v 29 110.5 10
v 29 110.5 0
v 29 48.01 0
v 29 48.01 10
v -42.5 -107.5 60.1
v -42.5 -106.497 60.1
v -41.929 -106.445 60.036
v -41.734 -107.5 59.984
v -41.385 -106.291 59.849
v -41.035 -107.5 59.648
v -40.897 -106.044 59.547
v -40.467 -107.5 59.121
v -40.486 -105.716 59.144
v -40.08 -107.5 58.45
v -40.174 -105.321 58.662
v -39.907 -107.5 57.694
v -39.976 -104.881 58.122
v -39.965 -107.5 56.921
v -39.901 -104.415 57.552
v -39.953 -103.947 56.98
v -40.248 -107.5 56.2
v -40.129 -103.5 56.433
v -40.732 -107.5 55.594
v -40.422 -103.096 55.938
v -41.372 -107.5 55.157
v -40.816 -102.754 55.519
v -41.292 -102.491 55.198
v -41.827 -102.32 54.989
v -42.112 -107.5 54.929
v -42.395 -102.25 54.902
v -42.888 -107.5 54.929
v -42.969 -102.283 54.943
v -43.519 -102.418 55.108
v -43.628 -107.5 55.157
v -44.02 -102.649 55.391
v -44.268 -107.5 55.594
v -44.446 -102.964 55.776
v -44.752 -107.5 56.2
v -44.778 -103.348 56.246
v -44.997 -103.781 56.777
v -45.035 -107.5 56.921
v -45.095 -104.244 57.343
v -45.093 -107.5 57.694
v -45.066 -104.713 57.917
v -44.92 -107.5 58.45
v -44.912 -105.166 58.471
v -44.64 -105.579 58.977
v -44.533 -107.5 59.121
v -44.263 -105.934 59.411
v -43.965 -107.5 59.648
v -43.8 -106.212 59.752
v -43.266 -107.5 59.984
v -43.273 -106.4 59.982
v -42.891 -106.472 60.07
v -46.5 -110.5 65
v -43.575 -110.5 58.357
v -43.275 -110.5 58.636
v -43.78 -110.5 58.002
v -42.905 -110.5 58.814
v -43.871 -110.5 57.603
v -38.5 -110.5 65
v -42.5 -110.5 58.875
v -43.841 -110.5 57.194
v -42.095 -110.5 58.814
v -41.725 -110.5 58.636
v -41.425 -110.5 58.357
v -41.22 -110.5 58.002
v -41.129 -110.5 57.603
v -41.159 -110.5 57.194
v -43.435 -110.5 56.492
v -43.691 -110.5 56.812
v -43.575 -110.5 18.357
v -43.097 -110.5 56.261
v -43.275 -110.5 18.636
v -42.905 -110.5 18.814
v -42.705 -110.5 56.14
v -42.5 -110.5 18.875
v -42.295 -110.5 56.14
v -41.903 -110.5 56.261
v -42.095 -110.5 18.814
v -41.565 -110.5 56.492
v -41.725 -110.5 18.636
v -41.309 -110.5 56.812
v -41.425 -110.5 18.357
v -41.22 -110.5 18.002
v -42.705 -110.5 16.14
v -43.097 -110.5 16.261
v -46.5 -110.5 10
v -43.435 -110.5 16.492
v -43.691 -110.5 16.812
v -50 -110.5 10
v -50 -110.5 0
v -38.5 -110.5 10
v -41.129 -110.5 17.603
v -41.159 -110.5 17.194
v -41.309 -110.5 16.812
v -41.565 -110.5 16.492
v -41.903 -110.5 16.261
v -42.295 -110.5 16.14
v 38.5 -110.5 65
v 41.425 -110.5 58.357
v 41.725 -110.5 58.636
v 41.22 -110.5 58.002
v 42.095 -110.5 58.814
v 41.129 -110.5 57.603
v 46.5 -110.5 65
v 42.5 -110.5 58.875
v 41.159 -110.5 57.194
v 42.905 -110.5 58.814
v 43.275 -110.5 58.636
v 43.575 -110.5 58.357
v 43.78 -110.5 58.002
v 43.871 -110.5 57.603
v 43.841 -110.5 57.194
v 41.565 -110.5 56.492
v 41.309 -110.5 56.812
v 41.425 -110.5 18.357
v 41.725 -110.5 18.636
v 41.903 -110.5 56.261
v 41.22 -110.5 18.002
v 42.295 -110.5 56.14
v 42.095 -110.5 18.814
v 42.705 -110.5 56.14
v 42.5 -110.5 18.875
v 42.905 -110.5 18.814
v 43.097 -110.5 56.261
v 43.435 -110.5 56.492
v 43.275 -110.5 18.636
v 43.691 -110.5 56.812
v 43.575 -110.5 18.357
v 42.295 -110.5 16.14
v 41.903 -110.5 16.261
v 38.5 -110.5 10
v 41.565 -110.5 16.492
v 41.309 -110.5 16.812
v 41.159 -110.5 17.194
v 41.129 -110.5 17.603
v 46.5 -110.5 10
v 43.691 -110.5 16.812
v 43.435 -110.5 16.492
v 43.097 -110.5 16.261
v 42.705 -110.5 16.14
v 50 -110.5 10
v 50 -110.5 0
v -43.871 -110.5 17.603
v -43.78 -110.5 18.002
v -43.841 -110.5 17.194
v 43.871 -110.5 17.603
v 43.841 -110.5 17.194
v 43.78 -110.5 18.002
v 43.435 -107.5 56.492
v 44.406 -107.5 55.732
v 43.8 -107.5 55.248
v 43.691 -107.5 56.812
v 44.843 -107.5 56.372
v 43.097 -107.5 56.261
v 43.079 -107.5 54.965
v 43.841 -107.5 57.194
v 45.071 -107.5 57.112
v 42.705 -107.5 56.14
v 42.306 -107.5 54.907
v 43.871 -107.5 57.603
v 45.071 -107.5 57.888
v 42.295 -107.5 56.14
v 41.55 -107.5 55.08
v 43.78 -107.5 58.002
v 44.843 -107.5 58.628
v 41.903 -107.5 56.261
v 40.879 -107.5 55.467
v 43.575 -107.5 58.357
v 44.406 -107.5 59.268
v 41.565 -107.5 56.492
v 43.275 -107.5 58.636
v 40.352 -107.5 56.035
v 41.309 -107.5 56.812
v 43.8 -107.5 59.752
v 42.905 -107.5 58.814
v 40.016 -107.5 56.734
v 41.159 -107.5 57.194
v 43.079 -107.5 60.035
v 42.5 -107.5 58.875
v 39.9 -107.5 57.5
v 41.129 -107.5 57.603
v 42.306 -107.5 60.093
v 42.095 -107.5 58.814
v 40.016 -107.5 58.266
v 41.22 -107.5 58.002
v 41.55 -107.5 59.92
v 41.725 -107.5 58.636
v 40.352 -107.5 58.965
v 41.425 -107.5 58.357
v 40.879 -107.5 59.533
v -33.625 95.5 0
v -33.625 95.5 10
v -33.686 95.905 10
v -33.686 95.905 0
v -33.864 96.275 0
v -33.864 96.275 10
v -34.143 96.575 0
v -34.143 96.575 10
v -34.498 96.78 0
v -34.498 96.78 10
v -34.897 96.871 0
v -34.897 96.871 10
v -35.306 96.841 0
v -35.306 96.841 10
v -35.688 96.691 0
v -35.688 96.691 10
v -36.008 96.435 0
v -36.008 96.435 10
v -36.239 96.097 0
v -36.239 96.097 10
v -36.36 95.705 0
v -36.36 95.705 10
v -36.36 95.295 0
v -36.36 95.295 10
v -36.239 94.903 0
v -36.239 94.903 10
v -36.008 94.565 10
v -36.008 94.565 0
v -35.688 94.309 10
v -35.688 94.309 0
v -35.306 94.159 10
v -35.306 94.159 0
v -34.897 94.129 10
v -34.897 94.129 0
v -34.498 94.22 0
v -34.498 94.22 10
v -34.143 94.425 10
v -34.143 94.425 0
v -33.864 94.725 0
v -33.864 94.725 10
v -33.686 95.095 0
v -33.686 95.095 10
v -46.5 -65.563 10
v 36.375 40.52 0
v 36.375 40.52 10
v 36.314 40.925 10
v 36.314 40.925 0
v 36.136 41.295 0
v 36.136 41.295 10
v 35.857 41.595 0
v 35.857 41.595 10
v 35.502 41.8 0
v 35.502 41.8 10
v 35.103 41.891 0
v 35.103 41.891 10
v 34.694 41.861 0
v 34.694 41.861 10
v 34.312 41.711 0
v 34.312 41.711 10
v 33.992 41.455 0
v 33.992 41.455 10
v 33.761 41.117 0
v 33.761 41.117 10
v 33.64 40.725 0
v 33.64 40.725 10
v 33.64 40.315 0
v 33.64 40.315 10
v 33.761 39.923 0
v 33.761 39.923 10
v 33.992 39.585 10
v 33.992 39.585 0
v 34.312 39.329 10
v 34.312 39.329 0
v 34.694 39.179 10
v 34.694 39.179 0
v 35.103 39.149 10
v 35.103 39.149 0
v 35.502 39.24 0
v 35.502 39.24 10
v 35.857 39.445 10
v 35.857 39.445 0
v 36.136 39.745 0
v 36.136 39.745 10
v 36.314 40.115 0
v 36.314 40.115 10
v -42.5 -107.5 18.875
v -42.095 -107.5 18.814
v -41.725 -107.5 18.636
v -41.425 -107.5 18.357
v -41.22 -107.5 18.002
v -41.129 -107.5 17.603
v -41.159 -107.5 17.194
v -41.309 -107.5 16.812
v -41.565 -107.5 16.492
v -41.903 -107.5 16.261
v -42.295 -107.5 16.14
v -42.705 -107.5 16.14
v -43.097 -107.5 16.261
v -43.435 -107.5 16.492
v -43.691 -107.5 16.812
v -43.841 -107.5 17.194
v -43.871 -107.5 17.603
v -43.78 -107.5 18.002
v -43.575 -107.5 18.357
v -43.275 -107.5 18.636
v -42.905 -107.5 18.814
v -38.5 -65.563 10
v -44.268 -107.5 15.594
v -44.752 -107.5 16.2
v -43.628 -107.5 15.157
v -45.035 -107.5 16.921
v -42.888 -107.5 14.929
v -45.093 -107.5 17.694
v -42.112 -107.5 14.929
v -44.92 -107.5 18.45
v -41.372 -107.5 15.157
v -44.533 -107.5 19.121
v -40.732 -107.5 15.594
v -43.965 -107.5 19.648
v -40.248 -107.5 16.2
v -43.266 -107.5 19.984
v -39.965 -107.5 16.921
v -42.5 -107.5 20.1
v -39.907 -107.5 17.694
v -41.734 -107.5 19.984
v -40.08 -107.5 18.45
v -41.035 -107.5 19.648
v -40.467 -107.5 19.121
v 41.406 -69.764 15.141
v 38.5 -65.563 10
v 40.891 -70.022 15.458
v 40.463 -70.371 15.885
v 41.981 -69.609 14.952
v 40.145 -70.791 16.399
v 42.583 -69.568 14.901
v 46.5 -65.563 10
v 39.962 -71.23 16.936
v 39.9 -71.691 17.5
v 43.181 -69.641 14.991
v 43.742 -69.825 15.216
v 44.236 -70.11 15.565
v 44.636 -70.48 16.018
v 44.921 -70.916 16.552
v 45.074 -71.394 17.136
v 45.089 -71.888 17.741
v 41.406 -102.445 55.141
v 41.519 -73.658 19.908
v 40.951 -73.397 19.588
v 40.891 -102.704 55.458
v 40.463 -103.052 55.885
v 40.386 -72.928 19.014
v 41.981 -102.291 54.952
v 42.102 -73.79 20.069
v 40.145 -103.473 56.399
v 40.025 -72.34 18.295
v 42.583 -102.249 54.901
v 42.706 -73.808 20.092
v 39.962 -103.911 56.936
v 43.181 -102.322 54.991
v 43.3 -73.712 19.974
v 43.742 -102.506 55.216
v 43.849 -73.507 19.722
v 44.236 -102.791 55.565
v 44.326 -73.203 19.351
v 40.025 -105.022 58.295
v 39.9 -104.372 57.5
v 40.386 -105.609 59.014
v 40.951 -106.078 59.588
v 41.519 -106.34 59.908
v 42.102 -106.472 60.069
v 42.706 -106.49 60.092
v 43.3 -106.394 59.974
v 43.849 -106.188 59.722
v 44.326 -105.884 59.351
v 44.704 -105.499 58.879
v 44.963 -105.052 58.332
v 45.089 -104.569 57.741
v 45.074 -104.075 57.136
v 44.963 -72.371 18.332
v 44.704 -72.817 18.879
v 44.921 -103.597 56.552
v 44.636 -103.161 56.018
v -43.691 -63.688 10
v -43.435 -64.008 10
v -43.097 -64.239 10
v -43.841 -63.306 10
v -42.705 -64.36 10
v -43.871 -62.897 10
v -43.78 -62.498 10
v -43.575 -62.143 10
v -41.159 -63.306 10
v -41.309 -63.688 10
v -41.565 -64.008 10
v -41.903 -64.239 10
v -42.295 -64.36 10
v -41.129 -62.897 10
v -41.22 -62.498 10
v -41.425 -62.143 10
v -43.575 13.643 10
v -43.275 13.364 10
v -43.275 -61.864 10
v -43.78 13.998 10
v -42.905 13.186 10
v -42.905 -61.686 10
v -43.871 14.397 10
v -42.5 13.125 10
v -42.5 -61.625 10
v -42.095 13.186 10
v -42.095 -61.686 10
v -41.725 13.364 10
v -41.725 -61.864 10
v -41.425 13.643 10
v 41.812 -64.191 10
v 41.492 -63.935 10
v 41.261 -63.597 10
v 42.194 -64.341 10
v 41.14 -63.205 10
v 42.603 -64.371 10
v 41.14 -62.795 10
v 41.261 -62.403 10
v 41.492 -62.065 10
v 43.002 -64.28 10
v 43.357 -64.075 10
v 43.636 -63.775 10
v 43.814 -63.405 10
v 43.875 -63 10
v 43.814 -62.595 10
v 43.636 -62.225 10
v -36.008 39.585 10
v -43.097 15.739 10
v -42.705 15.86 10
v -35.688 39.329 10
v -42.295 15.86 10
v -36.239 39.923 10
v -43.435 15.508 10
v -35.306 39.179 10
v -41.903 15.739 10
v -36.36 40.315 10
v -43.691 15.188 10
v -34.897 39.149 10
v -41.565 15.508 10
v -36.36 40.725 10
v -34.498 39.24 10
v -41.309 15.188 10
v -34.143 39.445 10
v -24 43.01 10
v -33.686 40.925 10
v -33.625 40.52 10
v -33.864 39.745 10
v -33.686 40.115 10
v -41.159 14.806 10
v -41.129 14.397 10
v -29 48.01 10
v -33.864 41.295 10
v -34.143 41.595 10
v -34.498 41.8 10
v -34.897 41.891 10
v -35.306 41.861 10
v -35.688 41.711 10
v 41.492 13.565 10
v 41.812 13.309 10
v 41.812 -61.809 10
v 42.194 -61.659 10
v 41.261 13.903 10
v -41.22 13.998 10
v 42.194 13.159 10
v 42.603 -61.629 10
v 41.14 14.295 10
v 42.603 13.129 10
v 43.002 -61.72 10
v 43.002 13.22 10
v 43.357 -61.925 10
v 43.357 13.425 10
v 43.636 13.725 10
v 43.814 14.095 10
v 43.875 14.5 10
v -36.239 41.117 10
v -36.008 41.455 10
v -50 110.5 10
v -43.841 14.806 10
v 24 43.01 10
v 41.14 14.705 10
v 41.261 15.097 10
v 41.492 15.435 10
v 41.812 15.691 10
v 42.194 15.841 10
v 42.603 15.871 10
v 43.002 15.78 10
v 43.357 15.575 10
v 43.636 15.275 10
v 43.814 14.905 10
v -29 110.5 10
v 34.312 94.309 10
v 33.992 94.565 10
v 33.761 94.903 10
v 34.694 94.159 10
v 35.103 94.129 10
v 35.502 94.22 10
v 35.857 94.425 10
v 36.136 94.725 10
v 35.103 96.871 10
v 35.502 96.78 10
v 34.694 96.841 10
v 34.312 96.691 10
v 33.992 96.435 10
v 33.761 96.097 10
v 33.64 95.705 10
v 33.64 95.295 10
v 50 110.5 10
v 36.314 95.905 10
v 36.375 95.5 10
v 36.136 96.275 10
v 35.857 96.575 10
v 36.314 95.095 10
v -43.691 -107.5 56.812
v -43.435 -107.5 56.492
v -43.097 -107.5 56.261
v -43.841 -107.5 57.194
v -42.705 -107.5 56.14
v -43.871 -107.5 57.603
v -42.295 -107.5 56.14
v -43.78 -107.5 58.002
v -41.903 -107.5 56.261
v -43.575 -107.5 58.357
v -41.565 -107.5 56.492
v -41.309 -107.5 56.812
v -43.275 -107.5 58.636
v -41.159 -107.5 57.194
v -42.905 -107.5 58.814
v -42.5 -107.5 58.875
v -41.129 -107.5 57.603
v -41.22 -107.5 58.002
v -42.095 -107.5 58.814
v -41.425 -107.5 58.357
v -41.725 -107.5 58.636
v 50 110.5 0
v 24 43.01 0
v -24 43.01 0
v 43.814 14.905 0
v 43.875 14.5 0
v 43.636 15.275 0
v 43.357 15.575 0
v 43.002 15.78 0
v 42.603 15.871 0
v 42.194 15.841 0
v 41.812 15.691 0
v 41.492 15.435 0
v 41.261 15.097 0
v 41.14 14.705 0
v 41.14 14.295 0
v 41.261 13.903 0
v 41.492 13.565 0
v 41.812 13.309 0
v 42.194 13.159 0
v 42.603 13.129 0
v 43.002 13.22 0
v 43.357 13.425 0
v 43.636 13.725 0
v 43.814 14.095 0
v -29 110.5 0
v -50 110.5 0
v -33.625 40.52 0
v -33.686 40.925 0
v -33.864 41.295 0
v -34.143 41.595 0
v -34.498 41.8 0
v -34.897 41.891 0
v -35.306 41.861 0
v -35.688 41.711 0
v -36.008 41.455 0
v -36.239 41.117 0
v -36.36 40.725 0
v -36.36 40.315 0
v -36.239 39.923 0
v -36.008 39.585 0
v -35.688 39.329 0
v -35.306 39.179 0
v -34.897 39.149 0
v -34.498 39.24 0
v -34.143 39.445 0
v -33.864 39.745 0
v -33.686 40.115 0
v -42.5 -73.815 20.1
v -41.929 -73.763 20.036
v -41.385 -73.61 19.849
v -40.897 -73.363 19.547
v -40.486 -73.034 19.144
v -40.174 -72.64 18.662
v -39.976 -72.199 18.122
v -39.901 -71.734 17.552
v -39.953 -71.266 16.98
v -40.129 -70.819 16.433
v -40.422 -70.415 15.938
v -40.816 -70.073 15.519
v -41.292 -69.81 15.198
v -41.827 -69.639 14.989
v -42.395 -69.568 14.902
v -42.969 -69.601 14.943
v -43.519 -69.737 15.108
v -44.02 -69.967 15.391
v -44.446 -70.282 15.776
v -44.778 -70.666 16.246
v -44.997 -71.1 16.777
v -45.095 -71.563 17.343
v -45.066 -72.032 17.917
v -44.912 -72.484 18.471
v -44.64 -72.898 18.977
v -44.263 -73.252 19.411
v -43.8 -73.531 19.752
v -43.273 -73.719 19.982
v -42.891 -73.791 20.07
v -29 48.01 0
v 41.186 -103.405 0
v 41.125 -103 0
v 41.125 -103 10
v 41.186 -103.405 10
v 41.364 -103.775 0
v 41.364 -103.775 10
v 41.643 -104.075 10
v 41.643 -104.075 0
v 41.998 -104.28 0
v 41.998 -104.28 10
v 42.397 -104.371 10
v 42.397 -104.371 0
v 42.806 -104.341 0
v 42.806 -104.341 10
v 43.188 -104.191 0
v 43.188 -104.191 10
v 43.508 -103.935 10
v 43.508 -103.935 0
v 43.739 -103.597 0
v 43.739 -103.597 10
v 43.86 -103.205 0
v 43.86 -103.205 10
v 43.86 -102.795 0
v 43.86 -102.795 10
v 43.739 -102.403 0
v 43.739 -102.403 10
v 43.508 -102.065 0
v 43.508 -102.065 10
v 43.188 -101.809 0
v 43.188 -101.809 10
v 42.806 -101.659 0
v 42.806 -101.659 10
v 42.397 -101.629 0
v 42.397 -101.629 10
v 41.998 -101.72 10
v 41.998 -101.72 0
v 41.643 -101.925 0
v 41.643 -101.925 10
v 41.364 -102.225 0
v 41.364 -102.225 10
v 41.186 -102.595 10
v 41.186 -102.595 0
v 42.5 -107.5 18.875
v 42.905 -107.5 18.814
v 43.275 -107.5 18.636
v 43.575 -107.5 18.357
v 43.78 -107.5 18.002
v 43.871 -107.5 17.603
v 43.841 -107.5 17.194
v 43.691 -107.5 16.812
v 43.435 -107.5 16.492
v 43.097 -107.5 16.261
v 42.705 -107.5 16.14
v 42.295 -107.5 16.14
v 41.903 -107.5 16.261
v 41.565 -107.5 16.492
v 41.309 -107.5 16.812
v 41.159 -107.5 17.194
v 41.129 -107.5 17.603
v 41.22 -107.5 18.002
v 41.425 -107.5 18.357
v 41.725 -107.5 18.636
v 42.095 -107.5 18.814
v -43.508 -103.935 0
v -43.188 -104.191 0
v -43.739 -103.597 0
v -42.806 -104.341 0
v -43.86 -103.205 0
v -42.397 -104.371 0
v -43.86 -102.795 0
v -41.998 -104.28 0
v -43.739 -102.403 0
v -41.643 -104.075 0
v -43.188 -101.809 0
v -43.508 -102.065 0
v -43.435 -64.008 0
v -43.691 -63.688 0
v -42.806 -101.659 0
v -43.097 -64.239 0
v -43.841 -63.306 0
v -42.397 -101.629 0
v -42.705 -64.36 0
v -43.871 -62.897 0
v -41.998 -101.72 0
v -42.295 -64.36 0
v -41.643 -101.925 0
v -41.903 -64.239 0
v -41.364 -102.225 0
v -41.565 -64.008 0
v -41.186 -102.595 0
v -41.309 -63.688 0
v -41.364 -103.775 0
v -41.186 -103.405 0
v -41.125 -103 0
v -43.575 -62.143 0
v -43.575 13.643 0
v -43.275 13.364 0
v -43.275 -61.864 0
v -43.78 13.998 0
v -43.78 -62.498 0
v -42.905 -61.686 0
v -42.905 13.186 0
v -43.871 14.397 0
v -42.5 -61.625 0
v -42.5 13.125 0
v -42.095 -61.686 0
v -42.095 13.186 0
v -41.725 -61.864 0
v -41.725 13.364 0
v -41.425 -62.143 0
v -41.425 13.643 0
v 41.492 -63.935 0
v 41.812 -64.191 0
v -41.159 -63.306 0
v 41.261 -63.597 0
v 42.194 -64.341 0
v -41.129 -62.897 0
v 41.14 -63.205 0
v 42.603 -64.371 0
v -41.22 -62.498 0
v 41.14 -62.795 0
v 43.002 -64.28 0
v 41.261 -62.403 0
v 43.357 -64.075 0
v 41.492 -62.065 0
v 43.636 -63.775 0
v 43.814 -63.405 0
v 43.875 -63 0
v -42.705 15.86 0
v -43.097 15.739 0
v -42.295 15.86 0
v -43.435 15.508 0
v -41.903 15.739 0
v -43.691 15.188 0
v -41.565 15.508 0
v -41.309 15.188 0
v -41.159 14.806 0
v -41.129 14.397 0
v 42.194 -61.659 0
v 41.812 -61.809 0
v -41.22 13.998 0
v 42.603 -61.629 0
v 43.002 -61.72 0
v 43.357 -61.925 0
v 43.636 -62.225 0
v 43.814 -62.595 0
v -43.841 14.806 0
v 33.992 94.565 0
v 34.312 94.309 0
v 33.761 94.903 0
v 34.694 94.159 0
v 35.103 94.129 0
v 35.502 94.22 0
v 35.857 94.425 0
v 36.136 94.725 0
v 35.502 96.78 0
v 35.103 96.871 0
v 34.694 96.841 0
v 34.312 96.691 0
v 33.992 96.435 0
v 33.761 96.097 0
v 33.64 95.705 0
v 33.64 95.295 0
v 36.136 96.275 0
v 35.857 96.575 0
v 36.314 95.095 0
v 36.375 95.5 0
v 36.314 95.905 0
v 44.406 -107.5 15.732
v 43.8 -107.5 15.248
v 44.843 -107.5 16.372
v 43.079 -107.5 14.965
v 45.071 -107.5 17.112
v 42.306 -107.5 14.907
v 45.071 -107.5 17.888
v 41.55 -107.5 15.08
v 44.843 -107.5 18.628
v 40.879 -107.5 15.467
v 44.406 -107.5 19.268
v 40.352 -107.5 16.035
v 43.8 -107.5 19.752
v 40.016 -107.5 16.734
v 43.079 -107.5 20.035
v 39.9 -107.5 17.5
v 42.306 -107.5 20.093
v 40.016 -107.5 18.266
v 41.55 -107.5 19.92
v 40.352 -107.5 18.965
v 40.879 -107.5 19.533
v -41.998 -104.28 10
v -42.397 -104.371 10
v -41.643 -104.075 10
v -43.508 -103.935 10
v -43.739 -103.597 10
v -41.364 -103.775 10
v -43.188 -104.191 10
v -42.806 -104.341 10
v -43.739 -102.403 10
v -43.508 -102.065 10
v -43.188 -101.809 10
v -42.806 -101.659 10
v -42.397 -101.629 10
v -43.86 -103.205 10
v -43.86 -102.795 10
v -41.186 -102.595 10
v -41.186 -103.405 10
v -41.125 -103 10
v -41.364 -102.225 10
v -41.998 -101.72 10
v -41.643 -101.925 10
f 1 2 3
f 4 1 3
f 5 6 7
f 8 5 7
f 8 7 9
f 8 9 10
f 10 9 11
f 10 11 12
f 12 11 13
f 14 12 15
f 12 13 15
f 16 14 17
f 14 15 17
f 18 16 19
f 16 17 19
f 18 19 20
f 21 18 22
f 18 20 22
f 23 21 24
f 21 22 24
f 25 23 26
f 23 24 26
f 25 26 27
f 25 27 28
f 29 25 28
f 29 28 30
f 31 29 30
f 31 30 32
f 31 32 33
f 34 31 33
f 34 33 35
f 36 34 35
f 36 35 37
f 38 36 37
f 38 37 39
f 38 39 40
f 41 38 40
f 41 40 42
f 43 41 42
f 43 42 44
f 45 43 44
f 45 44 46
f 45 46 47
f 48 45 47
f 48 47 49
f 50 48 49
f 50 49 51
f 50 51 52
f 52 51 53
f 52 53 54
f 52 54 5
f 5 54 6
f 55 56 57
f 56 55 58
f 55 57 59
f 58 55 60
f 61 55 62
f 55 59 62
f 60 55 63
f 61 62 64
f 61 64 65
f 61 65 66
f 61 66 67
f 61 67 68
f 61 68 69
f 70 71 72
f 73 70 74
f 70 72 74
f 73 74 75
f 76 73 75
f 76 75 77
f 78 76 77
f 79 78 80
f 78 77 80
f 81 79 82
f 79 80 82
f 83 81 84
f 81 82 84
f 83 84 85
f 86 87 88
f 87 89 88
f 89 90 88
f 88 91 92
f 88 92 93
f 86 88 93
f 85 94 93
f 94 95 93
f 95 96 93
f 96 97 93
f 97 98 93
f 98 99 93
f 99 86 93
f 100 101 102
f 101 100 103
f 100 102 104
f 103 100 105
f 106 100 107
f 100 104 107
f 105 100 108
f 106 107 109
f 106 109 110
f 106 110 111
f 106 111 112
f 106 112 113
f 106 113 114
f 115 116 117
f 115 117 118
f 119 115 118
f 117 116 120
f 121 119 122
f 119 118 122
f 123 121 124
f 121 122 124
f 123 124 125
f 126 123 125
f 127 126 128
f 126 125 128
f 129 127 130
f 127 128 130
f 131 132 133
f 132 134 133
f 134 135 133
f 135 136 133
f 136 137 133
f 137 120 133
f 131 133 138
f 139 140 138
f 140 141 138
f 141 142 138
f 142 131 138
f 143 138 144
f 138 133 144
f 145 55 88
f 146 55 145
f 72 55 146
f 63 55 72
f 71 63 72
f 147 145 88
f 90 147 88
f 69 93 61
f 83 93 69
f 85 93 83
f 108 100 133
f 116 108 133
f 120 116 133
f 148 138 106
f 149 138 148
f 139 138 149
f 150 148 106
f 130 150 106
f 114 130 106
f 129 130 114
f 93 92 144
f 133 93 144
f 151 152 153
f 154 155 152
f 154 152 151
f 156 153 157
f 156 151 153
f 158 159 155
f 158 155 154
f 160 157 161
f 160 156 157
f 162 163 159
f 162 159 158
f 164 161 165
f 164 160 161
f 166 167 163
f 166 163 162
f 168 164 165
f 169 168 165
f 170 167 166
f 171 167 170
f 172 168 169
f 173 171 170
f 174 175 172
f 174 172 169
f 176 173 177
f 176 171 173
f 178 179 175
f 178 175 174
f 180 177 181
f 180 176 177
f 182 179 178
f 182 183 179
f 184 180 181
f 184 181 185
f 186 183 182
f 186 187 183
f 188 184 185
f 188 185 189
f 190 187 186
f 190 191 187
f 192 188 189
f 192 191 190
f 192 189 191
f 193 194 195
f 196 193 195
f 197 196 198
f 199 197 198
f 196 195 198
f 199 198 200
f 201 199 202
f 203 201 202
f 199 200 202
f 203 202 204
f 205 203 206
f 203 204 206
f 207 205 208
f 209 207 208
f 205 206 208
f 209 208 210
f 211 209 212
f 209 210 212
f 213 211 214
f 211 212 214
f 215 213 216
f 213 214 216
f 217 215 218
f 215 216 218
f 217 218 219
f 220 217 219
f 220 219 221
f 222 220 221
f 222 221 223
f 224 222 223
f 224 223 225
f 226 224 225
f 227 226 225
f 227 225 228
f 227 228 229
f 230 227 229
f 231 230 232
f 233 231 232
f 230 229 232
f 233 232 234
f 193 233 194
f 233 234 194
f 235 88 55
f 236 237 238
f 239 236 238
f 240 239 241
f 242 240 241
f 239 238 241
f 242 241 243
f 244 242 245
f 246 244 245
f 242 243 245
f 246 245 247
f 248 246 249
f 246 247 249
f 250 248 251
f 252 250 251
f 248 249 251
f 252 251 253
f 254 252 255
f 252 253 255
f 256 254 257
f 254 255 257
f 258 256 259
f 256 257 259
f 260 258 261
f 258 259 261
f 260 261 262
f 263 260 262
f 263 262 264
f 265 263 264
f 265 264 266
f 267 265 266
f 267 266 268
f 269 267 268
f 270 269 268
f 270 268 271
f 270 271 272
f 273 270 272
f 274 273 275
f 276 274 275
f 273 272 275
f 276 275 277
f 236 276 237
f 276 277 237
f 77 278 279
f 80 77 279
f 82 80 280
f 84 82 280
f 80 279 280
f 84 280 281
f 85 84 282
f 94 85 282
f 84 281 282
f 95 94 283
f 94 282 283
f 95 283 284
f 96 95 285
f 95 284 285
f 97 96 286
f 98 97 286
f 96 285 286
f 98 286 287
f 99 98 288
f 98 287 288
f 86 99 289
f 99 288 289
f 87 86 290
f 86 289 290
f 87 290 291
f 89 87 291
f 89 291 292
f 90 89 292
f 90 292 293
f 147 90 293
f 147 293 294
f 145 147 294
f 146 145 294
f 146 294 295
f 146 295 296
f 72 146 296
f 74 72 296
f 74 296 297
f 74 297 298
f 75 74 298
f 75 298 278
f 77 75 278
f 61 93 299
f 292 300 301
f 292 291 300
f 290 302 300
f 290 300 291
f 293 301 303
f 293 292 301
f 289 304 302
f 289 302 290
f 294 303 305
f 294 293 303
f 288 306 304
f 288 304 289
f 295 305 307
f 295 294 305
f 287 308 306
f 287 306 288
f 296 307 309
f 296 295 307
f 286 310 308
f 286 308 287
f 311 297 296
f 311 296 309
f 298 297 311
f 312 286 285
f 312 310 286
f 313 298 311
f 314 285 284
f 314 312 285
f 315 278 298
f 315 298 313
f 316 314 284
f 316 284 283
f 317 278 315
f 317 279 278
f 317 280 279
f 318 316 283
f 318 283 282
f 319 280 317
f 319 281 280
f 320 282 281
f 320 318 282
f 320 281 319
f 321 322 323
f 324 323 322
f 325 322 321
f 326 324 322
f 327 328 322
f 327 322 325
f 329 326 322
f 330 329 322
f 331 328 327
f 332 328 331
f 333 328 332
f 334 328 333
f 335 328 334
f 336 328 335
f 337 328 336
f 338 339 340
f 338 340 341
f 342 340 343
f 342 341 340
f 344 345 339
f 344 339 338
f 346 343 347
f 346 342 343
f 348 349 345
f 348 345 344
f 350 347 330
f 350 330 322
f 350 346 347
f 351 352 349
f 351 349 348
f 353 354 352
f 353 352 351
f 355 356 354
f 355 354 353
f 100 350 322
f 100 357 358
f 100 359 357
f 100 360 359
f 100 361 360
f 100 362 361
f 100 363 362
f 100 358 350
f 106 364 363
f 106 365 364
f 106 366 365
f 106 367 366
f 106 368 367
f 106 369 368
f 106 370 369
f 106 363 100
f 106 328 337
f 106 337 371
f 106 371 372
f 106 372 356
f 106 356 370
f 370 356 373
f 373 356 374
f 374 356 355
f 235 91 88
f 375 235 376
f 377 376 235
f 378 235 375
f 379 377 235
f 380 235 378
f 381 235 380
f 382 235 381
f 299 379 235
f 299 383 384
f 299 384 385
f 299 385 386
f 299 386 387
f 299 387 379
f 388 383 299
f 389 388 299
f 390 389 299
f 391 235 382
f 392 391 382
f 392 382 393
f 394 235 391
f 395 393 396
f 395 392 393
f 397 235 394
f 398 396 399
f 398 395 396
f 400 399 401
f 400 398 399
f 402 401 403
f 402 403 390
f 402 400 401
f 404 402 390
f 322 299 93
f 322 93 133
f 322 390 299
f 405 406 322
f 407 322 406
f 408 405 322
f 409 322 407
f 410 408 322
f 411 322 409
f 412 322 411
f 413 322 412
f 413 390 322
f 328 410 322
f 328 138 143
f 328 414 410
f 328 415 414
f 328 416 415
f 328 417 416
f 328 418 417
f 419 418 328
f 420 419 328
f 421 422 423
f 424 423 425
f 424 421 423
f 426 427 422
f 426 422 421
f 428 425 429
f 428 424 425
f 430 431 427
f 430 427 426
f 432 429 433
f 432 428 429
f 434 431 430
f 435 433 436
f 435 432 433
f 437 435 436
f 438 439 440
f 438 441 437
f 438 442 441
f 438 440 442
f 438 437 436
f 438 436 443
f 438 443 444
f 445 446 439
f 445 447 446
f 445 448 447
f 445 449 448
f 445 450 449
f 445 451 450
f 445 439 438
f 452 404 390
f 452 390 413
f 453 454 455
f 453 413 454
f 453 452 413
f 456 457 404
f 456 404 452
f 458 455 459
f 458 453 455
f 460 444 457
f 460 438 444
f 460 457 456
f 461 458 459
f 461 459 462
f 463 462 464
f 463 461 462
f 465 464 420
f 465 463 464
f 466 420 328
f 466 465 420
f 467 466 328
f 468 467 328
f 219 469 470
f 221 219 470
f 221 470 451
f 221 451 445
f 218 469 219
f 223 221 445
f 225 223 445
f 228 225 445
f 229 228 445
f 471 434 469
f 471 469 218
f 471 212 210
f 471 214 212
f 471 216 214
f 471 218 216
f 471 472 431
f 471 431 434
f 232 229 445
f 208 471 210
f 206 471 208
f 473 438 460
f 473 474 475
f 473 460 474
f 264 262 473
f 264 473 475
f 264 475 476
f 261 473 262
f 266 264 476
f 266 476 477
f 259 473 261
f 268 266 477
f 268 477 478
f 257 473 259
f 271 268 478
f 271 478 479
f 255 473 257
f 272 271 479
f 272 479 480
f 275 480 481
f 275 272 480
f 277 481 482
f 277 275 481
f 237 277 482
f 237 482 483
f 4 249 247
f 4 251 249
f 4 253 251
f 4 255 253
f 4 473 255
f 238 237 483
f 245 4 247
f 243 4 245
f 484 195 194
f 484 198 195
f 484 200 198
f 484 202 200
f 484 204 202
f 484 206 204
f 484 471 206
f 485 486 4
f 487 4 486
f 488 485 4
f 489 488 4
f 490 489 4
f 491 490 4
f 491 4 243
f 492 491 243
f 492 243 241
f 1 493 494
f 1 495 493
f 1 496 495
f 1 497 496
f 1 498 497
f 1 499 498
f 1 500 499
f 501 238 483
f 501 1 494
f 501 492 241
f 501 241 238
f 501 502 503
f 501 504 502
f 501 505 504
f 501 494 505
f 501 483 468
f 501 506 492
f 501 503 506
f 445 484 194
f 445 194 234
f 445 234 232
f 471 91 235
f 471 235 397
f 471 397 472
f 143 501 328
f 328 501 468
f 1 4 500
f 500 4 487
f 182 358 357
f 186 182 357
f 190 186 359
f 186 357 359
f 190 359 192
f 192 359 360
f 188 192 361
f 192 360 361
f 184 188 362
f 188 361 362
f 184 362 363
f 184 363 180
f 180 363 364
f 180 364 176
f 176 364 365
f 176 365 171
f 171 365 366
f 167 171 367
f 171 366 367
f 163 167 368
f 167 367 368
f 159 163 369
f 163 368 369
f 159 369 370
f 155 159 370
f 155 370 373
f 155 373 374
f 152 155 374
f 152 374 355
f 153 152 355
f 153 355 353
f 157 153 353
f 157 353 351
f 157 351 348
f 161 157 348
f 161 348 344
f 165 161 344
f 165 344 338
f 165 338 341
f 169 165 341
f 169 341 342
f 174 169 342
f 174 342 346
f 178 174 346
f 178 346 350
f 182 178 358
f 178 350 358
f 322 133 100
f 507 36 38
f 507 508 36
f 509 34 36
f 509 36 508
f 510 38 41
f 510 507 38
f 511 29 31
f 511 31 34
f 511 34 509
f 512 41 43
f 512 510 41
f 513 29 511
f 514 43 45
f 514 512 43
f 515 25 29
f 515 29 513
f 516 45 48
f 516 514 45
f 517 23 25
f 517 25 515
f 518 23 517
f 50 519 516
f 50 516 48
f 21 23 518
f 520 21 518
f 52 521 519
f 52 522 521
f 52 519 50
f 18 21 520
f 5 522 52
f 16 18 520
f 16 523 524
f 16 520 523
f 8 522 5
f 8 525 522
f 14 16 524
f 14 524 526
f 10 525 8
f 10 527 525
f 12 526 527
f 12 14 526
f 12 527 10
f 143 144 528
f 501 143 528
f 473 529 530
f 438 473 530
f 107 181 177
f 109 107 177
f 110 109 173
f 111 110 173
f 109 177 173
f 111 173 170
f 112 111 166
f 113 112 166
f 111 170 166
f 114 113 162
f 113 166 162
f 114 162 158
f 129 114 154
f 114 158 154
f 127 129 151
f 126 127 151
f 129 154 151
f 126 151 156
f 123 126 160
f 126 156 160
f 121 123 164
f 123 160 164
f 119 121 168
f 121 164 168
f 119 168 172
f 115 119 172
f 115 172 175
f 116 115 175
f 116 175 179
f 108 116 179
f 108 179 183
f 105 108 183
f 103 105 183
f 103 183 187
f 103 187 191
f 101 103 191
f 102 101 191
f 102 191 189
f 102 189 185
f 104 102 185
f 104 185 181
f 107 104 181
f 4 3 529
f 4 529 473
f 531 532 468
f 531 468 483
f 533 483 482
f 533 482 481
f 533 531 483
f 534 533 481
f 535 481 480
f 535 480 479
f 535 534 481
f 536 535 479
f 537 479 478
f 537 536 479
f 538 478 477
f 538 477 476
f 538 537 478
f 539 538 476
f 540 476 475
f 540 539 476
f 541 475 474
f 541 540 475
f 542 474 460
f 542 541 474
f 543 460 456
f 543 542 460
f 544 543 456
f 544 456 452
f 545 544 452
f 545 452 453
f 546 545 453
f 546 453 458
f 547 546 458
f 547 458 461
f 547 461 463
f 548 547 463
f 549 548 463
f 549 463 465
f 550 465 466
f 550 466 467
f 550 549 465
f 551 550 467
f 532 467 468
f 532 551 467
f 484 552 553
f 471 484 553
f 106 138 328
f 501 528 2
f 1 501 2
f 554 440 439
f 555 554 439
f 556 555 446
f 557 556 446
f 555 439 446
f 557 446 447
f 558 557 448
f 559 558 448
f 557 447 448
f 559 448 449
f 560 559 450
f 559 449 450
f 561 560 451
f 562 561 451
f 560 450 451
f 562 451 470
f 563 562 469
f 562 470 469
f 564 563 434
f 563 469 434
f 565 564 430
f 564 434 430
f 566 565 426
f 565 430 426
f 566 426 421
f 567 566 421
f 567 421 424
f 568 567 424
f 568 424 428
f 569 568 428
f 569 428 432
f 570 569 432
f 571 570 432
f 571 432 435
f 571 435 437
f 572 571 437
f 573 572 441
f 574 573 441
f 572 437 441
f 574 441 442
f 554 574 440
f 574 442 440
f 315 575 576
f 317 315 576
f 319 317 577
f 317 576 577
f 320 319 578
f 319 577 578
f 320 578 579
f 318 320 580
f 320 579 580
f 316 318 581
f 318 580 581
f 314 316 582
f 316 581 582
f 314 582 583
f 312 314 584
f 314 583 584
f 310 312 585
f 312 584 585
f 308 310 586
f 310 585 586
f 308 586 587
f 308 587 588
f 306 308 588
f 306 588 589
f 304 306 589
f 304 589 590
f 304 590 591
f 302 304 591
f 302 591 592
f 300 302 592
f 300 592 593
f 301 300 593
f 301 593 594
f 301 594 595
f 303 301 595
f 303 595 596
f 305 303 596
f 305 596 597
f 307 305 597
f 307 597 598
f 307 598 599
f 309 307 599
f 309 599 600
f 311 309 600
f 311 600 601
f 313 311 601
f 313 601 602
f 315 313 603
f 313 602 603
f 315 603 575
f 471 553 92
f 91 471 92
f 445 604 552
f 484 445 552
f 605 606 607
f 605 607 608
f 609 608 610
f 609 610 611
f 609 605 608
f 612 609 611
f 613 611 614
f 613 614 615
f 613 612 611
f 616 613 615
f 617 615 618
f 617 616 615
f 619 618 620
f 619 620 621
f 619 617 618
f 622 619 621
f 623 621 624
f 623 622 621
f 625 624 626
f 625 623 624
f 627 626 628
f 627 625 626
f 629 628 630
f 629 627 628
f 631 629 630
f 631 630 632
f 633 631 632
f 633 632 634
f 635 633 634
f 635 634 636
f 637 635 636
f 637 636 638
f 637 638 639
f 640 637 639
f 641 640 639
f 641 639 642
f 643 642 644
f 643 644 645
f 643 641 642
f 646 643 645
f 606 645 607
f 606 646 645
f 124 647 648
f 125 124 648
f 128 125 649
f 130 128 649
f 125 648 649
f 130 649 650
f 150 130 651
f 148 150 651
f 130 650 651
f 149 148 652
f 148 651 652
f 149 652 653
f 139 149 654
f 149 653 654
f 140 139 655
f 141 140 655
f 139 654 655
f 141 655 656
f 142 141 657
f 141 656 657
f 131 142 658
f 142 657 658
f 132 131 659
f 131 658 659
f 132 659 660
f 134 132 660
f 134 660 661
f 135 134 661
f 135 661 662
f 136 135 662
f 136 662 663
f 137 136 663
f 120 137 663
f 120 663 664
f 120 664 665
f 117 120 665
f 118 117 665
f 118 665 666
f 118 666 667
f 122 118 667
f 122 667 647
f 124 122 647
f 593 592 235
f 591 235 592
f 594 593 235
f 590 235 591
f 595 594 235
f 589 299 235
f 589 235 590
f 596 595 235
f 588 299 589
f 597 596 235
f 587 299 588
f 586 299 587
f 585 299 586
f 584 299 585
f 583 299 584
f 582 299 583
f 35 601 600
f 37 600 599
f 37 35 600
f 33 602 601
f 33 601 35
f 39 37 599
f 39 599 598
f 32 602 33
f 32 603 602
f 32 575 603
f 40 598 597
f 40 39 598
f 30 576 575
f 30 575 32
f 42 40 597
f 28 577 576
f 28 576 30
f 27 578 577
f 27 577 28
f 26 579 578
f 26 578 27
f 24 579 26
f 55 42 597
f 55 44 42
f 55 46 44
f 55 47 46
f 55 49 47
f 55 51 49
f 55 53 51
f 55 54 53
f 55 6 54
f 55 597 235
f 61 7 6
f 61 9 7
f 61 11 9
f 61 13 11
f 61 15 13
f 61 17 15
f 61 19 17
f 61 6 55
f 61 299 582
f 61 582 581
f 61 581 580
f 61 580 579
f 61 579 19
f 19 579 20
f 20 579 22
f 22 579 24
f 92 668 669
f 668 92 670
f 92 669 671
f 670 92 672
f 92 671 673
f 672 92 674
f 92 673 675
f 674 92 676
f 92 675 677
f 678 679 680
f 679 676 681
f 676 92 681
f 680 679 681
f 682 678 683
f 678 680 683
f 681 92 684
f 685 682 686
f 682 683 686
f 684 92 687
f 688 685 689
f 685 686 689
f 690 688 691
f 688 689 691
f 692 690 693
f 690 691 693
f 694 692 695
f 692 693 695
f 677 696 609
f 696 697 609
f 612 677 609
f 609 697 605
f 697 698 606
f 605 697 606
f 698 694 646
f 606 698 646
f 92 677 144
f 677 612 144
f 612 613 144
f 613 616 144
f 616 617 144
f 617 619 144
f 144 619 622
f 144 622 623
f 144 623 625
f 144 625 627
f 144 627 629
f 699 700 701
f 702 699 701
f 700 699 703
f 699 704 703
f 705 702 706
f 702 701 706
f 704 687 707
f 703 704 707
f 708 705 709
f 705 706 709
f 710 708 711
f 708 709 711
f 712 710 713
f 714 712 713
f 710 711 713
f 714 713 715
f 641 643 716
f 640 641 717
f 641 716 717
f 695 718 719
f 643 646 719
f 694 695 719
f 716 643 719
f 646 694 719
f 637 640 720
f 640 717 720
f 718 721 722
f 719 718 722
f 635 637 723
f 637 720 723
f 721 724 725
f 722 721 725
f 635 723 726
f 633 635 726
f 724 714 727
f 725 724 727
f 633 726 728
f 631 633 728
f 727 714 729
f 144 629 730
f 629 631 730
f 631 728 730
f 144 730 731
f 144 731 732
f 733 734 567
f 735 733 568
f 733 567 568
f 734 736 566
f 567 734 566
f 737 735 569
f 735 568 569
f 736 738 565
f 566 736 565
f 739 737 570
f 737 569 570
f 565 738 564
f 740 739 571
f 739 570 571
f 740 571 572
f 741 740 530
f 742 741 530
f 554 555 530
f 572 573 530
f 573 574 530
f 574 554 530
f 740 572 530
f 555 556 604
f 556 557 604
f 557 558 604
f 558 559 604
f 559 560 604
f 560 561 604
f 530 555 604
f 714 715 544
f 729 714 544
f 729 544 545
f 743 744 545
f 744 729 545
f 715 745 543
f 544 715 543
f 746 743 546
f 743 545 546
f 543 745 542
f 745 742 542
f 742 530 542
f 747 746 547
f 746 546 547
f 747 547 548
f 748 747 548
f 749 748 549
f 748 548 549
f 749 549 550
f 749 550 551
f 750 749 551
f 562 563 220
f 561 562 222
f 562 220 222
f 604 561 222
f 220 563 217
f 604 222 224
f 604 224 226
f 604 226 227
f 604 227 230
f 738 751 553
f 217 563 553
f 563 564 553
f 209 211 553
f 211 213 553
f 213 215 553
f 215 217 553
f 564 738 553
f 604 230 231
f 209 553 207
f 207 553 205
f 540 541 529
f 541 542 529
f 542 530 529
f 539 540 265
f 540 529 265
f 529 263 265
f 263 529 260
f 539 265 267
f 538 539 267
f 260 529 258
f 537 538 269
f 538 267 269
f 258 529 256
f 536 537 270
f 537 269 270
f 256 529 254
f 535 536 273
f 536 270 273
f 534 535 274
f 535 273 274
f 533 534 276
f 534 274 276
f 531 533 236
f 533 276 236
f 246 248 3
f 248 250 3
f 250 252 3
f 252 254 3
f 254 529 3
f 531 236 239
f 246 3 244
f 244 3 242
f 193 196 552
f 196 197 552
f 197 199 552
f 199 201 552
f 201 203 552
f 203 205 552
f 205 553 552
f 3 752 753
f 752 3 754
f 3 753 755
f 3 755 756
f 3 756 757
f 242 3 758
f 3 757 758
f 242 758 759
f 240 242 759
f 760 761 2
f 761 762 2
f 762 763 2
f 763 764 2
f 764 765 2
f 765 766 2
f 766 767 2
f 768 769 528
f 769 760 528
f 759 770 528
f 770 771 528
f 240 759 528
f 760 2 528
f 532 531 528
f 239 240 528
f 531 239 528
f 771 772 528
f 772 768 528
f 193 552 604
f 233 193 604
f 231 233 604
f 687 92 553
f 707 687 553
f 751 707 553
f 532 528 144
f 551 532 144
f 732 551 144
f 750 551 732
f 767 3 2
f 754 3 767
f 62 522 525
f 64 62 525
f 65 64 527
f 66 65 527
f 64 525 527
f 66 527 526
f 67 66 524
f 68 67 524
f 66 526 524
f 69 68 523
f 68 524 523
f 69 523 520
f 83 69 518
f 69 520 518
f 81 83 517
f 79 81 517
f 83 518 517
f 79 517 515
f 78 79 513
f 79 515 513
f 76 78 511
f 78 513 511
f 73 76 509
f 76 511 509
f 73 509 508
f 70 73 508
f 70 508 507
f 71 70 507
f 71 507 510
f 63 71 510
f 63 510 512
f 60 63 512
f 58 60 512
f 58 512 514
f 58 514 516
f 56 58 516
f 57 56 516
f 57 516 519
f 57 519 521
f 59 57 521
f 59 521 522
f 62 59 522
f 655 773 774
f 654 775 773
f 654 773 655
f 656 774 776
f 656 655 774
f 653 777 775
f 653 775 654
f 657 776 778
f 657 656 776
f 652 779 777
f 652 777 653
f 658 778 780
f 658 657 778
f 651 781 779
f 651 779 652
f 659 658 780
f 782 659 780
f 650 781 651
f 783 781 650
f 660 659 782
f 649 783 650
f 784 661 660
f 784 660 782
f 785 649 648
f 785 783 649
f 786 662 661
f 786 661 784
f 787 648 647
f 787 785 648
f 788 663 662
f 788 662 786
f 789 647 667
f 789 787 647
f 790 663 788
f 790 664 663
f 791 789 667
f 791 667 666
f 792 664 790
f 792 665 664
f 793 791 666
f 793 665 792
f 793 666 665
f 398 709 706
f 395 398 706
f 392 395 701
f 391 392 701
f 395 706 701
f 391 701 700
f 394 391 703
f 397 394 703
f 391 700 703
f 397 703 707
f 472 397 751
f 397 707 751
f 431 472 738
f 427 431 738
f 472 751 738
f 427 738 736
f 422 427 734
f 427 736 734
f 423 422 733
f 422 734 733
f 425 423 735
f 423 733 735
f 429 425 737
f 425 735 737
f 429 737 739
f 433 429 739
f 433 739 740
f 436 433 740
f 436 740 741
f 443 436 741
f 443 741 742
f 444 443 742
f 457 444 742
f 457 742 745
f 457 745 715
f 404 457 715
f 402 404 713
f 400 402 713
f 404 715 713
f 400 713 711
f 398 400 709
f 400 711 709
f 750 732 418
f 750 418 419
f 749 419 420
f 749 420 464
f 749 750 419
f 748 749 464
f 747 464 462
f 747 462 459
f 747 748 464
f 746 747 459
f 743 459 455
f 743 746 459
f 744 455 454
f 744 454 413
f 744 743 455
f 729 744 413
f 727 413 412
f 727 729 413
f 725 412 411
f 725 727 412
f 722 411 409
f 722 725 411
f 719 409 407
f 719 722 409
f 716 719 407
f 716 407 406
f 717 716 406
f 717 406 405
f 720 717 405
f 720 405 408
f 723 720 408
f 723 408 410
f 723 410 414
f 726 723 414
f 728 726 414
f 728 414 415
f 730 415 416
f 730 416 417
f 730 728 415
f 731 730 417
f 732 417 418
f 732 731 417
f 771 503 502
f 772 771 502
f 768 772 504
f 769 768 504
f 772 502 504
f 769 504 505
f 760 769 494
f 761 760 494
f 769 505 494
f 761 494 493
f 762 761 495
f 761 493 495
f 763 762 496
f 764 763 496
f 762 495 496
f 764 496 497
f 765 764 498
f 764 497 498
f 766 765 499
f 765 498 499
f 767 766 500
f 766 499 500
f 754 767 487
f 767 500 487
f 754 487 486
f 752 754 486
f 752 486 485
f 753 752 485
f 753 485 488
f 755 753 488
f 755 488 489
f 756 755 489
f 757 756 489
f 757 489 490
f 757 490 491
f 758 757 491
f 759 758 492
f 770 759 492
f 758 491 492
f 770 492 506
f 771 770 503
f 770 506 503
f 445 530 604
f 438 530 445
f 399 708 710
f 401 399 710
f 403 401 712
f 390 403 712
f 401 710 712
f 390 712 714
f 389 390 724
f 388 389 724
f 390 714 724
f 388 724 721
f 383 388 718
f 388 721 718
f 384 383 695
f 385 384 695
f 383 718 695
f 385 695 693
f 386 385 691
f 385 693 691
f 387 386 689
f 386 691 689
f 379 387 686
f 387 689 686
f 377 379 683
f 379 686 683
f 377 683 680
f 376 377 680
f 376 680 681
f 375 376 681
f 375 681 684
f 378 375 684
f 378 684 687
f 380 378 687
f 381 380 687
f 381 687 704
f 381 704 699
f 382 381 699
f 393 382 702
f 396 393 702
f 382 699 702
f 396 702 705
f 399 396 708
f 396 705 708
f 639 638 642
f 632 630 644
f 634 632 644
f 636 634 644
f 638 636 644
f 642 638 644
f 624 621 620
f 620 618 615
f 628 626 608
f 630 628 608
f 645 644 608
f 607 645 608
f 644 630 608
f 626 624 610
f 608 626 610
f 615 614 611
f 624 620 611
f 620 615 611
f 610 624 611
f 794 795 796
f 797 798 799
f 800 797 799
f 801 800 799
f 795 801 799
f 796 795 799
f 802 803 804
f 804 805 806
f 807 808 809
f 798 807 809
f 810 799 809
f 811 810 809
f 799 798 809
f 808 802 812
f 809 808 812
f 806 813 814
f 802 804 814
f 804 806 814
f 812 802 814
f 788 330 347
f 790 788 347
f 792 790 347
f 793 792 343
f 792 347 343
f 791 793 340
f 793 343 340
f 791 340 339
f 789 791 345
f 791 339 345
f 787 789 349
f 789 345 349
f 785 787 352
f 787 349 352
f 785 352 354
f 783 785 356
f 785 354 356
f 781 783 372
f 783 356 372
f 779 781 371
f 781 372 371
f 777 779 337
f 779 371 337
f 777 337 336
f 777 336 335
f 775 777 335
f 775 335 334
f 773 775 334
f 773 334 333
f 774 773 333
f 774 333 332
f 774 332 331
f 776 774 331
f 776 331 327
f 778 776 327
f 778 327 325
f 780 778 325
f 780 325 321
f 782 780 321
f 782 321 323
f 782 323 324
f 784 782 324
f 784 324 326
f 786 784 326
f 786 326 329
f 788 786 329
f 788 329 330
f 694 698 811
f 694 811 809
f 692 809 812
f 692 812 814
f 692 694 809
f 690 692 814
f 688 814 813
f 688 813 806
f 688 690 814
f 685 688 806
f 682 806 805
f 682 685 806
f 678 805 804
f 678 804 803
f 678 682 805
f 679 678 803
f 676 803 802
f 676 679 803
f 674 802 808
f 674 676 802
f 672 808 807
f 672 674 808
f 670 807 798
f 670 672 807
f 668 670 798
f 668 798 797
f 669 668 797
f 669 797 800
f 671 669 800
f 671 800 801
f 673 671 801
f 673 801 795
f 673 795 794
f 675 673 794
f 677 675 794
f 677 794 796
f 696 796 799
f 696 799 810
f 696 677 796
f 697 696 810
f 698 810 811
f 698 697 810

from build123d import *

# Parameters (mm, degrees)
SKETCH1_R           = 1.375
BOSS_EXTRUDE1_DEPTH = 10
CHAMFER1_SIZE       = 5
SKETCH2_W           = 8
SKETCH2_H           = 45
BOSS_EXTRUDE2_DEPTH = 55
SKETCH5_R           = 1.375
CUT_EXTRUDE2_DEPTH  = 186.151289491
SKETCH5_3_R         = 2.6
CUT_EXTRUDE3_DEPTH  = 52
SKETCH1_3_R         = 1.375
CUT_EXTRUDE4_DEPTH  = 10
CHAMFER3_SIZE       = 55.077249093
CHAMFER3_SIZE_2     = 45
SKETCH6_R           = 1.375
CUT_EXTRUDE5_DEPTH  = 10


with BuildPart() as part:
    # Sketch1 → Boss-Extrude1 (new body)
    with BuildSketch(Plane.XY):
        Polygon((-50, 110.5), (-50, -110.5), (50, -110.5), (50, 110.5), (29, 110.5), (29, 43.01), (-29, 43.01), (-29, 110.5), align=None)
        with BuildLine():
            ThreePointArc((-42.5, -64.375), (-43.875, -63), (-42.5, -61.625))
            ThreePointArc((-42.5, -61.625), (-41.125, -63), (-42.5, -64.375))
        make_face(mode=Mode.SUBTRACT)
        with Locations((42.5, -63)):
            Circle(SKETCH1_R, mode=Mode.SUBTRACT)
        with BuildLine():
            ThreePointArc((-42.5, 15.875), (-41.125, 14.5), (-42.5, 13.125))
            ThreePointArc((-42.5, 13.125), (-43.875, 14.5), (-42.5, 15.875))
        make_face(mode=Mode.SUBTRACT)
        with Locations((42.5, 14.5)):
            Circle(SKETCH1_R, mode=Mode.SUBTRACT)
    extrude(amount=BOSS_EXTRUDE1_DEPTH)

    # Chamfer1
    chamfer1_edges = [part.edges().sort_by_distance(p)[0] for p in [
        (29, 43.01, 5),
        (-29, 43.01, 5),
    ]]
    chamfer(chamfer1_edges, length=CHAMFER1_SIZE)

    # Sketch2 → Boss-Extrude2 (add)
    with BuildSketch(Plane.XY.offset(10)):
        with Locations((-42.5, -88)):
            Rectangle(SKETCH2_W, SKETCH2_H)
        with Locations((42.5, -88)):
            Rectangle(SKETCH2_W, SKETCH2_H)
    extrude(amount=BOSS_EXTRUDE2_DEPTH)

    # Sketch5 → Cut-Extrude2 (cut, through all)
    with BuildSketch(Plane(origin=(0, -55.5, 0), x_dir=(1, 0, 0), z_dir=(0, 1, 0))):
        with Locations(Location((-42.5, -17.5, 0), (0, 0, 270))):
            Circle(SKETCH5_R)
        with Locations(Location((-42.5, -57.5, 0), (0, 0, 270))):
            Circle(SKETCH5_R)
        with Locations(Location((42.5, -17.5, 0), (0, 0, 270))):
            Circle(SKETCH5_R)
        with Locations(Location((42.5, -57.5, 0), (0, 0, 270))):
            Circle(SKETCH5_R)
    extrude(amount=-CUT_EXTRUDE2_DEPTH, mode=Mode.SUBTRACT)

    # Sketch5<3> → Cut-Extrude3 (cut)
    with BuildSketch(Plane(origin=(0, -55.5, 0), x_dir=(1, 0, 0), z_dir=(0, 1, 0))):
        with Locations(Location((-42.5, -17.5, 0), (0, 0, 270))):
            Circle(SKETCH5_3_R)
        with Locations(Location((-42.5, -57.5, 0), (0, 0, 270))):
            Circle(SKETCH5_3_R)
        with Locations(Location((42.5, -17.5, 0), (0, 0, 180))):
            Circle(SKETCH5_3_R)
        with Locations(Location((42.5, -57.5, 0), (0, 0, 180))):
            Circle(SKETCH5_3_R)
    extrude(amount=-CUT_EXTRUDE3_DEPTH, mode=Mode.SUBTRACT)

    # Sketch1<3> → Cut-Extrude4 (cut)
    with BuildSketch(Plane.XY):
        with Locations((-42.5, -103)):
            Circle(SKETCH1_3_R)
        with Locations(Location((42.5, -103, 0), (0, 0, 180))):
            Circle(SKETCH1_3_R)
    extrude(amount=CUT_EXTRUDE4_DEPTH, mode=Mode.SUBTRACT)

    # Chamfer3
    # the kernel refuses this chamfer: 55.077249093, 45 mm, written as the material it takes off along each edge
    with BuildSketch(Plane(origin=(188.501029674, -65.5, 65), x_dir=(0, 0.02454043401221108, -0.9996988382000312), z_dir=(-1, 0, 0))) as chamfer3_piece_1_section:
        Polygon((CHAMFER3_SIZE * 0.9996988382, CHAMFER3_SIZE * 0.0245404340122), (-CHAMFER3_SIZE_2 * 0.0245404340122, CHAMFER3_SIZE_2 * 0.9996988382), (0, 0), align=None)
    chamfer3_piece_1 = extrude(amount=292.002059347, mode=Mode.PRIVATE)
    chamfer3_piece_1 = split(chamfer3_piece_1, bisect_by=Plane(origin=(42.5, -80.263234933, 10), z_dir=(0, 0, 1)), keep=Keep.TOP, mode=Mode.PRIVATE)
    add(chamfer3_piece_1, mode=Mode.SUBTRACT)
    with BuildSketch(Plane(origin=(103.501029674, -65.5, 65), x_dir=(0, 0.02454043401221108, -0.9996988382000312), z_dir=(-1, 0, 0))) as chamfer3_piece_2_section:
        Polygon((CHAMFER3_SIZE * 0.9996988382, CHAMFER3_SIZE * 0.0245404340122), (-CHAMFER3_SIZE_2 * 0.0245404340122, CHAMFER3_SIZE_2 * 0.9996988382), (0, 0), align=None)
    chamfer3_piece_2 = extrude(amount=292.002059347, mode=Mode.PRIVATE)
    chamfer3_piece_2 = split(chamfer3_piece_2, bisect_by=Plane(origin=(42.5, -80.263234933, 10), z_dir=(0, 0, 1)), keep=Keep.TOP, mode=Mode.PRIVATE)
    add(chamfer3_piece_2, mode=Mode.SUBTRACT)

    # Sketch6 → Cut-Extrude5 (cut)
    with BuildSketch(Plane.XY.offset(10)):
        with Locations((-35, 95.5)):
            Circle(SKETCH6_R)
        with Locations((35, 95.5)):
            Circle(SKETCH6_R)
        with Locations((35, 40.52)):
            Circle(SKETCH6_R)
        with Locations((-35, 40.52)):
            Circle(SKETCH6_R)
    extrude(amount=-CUT_EXTRUDE5_DEPTH, mode=Mode.SUBTRACT)


solid = part.part
